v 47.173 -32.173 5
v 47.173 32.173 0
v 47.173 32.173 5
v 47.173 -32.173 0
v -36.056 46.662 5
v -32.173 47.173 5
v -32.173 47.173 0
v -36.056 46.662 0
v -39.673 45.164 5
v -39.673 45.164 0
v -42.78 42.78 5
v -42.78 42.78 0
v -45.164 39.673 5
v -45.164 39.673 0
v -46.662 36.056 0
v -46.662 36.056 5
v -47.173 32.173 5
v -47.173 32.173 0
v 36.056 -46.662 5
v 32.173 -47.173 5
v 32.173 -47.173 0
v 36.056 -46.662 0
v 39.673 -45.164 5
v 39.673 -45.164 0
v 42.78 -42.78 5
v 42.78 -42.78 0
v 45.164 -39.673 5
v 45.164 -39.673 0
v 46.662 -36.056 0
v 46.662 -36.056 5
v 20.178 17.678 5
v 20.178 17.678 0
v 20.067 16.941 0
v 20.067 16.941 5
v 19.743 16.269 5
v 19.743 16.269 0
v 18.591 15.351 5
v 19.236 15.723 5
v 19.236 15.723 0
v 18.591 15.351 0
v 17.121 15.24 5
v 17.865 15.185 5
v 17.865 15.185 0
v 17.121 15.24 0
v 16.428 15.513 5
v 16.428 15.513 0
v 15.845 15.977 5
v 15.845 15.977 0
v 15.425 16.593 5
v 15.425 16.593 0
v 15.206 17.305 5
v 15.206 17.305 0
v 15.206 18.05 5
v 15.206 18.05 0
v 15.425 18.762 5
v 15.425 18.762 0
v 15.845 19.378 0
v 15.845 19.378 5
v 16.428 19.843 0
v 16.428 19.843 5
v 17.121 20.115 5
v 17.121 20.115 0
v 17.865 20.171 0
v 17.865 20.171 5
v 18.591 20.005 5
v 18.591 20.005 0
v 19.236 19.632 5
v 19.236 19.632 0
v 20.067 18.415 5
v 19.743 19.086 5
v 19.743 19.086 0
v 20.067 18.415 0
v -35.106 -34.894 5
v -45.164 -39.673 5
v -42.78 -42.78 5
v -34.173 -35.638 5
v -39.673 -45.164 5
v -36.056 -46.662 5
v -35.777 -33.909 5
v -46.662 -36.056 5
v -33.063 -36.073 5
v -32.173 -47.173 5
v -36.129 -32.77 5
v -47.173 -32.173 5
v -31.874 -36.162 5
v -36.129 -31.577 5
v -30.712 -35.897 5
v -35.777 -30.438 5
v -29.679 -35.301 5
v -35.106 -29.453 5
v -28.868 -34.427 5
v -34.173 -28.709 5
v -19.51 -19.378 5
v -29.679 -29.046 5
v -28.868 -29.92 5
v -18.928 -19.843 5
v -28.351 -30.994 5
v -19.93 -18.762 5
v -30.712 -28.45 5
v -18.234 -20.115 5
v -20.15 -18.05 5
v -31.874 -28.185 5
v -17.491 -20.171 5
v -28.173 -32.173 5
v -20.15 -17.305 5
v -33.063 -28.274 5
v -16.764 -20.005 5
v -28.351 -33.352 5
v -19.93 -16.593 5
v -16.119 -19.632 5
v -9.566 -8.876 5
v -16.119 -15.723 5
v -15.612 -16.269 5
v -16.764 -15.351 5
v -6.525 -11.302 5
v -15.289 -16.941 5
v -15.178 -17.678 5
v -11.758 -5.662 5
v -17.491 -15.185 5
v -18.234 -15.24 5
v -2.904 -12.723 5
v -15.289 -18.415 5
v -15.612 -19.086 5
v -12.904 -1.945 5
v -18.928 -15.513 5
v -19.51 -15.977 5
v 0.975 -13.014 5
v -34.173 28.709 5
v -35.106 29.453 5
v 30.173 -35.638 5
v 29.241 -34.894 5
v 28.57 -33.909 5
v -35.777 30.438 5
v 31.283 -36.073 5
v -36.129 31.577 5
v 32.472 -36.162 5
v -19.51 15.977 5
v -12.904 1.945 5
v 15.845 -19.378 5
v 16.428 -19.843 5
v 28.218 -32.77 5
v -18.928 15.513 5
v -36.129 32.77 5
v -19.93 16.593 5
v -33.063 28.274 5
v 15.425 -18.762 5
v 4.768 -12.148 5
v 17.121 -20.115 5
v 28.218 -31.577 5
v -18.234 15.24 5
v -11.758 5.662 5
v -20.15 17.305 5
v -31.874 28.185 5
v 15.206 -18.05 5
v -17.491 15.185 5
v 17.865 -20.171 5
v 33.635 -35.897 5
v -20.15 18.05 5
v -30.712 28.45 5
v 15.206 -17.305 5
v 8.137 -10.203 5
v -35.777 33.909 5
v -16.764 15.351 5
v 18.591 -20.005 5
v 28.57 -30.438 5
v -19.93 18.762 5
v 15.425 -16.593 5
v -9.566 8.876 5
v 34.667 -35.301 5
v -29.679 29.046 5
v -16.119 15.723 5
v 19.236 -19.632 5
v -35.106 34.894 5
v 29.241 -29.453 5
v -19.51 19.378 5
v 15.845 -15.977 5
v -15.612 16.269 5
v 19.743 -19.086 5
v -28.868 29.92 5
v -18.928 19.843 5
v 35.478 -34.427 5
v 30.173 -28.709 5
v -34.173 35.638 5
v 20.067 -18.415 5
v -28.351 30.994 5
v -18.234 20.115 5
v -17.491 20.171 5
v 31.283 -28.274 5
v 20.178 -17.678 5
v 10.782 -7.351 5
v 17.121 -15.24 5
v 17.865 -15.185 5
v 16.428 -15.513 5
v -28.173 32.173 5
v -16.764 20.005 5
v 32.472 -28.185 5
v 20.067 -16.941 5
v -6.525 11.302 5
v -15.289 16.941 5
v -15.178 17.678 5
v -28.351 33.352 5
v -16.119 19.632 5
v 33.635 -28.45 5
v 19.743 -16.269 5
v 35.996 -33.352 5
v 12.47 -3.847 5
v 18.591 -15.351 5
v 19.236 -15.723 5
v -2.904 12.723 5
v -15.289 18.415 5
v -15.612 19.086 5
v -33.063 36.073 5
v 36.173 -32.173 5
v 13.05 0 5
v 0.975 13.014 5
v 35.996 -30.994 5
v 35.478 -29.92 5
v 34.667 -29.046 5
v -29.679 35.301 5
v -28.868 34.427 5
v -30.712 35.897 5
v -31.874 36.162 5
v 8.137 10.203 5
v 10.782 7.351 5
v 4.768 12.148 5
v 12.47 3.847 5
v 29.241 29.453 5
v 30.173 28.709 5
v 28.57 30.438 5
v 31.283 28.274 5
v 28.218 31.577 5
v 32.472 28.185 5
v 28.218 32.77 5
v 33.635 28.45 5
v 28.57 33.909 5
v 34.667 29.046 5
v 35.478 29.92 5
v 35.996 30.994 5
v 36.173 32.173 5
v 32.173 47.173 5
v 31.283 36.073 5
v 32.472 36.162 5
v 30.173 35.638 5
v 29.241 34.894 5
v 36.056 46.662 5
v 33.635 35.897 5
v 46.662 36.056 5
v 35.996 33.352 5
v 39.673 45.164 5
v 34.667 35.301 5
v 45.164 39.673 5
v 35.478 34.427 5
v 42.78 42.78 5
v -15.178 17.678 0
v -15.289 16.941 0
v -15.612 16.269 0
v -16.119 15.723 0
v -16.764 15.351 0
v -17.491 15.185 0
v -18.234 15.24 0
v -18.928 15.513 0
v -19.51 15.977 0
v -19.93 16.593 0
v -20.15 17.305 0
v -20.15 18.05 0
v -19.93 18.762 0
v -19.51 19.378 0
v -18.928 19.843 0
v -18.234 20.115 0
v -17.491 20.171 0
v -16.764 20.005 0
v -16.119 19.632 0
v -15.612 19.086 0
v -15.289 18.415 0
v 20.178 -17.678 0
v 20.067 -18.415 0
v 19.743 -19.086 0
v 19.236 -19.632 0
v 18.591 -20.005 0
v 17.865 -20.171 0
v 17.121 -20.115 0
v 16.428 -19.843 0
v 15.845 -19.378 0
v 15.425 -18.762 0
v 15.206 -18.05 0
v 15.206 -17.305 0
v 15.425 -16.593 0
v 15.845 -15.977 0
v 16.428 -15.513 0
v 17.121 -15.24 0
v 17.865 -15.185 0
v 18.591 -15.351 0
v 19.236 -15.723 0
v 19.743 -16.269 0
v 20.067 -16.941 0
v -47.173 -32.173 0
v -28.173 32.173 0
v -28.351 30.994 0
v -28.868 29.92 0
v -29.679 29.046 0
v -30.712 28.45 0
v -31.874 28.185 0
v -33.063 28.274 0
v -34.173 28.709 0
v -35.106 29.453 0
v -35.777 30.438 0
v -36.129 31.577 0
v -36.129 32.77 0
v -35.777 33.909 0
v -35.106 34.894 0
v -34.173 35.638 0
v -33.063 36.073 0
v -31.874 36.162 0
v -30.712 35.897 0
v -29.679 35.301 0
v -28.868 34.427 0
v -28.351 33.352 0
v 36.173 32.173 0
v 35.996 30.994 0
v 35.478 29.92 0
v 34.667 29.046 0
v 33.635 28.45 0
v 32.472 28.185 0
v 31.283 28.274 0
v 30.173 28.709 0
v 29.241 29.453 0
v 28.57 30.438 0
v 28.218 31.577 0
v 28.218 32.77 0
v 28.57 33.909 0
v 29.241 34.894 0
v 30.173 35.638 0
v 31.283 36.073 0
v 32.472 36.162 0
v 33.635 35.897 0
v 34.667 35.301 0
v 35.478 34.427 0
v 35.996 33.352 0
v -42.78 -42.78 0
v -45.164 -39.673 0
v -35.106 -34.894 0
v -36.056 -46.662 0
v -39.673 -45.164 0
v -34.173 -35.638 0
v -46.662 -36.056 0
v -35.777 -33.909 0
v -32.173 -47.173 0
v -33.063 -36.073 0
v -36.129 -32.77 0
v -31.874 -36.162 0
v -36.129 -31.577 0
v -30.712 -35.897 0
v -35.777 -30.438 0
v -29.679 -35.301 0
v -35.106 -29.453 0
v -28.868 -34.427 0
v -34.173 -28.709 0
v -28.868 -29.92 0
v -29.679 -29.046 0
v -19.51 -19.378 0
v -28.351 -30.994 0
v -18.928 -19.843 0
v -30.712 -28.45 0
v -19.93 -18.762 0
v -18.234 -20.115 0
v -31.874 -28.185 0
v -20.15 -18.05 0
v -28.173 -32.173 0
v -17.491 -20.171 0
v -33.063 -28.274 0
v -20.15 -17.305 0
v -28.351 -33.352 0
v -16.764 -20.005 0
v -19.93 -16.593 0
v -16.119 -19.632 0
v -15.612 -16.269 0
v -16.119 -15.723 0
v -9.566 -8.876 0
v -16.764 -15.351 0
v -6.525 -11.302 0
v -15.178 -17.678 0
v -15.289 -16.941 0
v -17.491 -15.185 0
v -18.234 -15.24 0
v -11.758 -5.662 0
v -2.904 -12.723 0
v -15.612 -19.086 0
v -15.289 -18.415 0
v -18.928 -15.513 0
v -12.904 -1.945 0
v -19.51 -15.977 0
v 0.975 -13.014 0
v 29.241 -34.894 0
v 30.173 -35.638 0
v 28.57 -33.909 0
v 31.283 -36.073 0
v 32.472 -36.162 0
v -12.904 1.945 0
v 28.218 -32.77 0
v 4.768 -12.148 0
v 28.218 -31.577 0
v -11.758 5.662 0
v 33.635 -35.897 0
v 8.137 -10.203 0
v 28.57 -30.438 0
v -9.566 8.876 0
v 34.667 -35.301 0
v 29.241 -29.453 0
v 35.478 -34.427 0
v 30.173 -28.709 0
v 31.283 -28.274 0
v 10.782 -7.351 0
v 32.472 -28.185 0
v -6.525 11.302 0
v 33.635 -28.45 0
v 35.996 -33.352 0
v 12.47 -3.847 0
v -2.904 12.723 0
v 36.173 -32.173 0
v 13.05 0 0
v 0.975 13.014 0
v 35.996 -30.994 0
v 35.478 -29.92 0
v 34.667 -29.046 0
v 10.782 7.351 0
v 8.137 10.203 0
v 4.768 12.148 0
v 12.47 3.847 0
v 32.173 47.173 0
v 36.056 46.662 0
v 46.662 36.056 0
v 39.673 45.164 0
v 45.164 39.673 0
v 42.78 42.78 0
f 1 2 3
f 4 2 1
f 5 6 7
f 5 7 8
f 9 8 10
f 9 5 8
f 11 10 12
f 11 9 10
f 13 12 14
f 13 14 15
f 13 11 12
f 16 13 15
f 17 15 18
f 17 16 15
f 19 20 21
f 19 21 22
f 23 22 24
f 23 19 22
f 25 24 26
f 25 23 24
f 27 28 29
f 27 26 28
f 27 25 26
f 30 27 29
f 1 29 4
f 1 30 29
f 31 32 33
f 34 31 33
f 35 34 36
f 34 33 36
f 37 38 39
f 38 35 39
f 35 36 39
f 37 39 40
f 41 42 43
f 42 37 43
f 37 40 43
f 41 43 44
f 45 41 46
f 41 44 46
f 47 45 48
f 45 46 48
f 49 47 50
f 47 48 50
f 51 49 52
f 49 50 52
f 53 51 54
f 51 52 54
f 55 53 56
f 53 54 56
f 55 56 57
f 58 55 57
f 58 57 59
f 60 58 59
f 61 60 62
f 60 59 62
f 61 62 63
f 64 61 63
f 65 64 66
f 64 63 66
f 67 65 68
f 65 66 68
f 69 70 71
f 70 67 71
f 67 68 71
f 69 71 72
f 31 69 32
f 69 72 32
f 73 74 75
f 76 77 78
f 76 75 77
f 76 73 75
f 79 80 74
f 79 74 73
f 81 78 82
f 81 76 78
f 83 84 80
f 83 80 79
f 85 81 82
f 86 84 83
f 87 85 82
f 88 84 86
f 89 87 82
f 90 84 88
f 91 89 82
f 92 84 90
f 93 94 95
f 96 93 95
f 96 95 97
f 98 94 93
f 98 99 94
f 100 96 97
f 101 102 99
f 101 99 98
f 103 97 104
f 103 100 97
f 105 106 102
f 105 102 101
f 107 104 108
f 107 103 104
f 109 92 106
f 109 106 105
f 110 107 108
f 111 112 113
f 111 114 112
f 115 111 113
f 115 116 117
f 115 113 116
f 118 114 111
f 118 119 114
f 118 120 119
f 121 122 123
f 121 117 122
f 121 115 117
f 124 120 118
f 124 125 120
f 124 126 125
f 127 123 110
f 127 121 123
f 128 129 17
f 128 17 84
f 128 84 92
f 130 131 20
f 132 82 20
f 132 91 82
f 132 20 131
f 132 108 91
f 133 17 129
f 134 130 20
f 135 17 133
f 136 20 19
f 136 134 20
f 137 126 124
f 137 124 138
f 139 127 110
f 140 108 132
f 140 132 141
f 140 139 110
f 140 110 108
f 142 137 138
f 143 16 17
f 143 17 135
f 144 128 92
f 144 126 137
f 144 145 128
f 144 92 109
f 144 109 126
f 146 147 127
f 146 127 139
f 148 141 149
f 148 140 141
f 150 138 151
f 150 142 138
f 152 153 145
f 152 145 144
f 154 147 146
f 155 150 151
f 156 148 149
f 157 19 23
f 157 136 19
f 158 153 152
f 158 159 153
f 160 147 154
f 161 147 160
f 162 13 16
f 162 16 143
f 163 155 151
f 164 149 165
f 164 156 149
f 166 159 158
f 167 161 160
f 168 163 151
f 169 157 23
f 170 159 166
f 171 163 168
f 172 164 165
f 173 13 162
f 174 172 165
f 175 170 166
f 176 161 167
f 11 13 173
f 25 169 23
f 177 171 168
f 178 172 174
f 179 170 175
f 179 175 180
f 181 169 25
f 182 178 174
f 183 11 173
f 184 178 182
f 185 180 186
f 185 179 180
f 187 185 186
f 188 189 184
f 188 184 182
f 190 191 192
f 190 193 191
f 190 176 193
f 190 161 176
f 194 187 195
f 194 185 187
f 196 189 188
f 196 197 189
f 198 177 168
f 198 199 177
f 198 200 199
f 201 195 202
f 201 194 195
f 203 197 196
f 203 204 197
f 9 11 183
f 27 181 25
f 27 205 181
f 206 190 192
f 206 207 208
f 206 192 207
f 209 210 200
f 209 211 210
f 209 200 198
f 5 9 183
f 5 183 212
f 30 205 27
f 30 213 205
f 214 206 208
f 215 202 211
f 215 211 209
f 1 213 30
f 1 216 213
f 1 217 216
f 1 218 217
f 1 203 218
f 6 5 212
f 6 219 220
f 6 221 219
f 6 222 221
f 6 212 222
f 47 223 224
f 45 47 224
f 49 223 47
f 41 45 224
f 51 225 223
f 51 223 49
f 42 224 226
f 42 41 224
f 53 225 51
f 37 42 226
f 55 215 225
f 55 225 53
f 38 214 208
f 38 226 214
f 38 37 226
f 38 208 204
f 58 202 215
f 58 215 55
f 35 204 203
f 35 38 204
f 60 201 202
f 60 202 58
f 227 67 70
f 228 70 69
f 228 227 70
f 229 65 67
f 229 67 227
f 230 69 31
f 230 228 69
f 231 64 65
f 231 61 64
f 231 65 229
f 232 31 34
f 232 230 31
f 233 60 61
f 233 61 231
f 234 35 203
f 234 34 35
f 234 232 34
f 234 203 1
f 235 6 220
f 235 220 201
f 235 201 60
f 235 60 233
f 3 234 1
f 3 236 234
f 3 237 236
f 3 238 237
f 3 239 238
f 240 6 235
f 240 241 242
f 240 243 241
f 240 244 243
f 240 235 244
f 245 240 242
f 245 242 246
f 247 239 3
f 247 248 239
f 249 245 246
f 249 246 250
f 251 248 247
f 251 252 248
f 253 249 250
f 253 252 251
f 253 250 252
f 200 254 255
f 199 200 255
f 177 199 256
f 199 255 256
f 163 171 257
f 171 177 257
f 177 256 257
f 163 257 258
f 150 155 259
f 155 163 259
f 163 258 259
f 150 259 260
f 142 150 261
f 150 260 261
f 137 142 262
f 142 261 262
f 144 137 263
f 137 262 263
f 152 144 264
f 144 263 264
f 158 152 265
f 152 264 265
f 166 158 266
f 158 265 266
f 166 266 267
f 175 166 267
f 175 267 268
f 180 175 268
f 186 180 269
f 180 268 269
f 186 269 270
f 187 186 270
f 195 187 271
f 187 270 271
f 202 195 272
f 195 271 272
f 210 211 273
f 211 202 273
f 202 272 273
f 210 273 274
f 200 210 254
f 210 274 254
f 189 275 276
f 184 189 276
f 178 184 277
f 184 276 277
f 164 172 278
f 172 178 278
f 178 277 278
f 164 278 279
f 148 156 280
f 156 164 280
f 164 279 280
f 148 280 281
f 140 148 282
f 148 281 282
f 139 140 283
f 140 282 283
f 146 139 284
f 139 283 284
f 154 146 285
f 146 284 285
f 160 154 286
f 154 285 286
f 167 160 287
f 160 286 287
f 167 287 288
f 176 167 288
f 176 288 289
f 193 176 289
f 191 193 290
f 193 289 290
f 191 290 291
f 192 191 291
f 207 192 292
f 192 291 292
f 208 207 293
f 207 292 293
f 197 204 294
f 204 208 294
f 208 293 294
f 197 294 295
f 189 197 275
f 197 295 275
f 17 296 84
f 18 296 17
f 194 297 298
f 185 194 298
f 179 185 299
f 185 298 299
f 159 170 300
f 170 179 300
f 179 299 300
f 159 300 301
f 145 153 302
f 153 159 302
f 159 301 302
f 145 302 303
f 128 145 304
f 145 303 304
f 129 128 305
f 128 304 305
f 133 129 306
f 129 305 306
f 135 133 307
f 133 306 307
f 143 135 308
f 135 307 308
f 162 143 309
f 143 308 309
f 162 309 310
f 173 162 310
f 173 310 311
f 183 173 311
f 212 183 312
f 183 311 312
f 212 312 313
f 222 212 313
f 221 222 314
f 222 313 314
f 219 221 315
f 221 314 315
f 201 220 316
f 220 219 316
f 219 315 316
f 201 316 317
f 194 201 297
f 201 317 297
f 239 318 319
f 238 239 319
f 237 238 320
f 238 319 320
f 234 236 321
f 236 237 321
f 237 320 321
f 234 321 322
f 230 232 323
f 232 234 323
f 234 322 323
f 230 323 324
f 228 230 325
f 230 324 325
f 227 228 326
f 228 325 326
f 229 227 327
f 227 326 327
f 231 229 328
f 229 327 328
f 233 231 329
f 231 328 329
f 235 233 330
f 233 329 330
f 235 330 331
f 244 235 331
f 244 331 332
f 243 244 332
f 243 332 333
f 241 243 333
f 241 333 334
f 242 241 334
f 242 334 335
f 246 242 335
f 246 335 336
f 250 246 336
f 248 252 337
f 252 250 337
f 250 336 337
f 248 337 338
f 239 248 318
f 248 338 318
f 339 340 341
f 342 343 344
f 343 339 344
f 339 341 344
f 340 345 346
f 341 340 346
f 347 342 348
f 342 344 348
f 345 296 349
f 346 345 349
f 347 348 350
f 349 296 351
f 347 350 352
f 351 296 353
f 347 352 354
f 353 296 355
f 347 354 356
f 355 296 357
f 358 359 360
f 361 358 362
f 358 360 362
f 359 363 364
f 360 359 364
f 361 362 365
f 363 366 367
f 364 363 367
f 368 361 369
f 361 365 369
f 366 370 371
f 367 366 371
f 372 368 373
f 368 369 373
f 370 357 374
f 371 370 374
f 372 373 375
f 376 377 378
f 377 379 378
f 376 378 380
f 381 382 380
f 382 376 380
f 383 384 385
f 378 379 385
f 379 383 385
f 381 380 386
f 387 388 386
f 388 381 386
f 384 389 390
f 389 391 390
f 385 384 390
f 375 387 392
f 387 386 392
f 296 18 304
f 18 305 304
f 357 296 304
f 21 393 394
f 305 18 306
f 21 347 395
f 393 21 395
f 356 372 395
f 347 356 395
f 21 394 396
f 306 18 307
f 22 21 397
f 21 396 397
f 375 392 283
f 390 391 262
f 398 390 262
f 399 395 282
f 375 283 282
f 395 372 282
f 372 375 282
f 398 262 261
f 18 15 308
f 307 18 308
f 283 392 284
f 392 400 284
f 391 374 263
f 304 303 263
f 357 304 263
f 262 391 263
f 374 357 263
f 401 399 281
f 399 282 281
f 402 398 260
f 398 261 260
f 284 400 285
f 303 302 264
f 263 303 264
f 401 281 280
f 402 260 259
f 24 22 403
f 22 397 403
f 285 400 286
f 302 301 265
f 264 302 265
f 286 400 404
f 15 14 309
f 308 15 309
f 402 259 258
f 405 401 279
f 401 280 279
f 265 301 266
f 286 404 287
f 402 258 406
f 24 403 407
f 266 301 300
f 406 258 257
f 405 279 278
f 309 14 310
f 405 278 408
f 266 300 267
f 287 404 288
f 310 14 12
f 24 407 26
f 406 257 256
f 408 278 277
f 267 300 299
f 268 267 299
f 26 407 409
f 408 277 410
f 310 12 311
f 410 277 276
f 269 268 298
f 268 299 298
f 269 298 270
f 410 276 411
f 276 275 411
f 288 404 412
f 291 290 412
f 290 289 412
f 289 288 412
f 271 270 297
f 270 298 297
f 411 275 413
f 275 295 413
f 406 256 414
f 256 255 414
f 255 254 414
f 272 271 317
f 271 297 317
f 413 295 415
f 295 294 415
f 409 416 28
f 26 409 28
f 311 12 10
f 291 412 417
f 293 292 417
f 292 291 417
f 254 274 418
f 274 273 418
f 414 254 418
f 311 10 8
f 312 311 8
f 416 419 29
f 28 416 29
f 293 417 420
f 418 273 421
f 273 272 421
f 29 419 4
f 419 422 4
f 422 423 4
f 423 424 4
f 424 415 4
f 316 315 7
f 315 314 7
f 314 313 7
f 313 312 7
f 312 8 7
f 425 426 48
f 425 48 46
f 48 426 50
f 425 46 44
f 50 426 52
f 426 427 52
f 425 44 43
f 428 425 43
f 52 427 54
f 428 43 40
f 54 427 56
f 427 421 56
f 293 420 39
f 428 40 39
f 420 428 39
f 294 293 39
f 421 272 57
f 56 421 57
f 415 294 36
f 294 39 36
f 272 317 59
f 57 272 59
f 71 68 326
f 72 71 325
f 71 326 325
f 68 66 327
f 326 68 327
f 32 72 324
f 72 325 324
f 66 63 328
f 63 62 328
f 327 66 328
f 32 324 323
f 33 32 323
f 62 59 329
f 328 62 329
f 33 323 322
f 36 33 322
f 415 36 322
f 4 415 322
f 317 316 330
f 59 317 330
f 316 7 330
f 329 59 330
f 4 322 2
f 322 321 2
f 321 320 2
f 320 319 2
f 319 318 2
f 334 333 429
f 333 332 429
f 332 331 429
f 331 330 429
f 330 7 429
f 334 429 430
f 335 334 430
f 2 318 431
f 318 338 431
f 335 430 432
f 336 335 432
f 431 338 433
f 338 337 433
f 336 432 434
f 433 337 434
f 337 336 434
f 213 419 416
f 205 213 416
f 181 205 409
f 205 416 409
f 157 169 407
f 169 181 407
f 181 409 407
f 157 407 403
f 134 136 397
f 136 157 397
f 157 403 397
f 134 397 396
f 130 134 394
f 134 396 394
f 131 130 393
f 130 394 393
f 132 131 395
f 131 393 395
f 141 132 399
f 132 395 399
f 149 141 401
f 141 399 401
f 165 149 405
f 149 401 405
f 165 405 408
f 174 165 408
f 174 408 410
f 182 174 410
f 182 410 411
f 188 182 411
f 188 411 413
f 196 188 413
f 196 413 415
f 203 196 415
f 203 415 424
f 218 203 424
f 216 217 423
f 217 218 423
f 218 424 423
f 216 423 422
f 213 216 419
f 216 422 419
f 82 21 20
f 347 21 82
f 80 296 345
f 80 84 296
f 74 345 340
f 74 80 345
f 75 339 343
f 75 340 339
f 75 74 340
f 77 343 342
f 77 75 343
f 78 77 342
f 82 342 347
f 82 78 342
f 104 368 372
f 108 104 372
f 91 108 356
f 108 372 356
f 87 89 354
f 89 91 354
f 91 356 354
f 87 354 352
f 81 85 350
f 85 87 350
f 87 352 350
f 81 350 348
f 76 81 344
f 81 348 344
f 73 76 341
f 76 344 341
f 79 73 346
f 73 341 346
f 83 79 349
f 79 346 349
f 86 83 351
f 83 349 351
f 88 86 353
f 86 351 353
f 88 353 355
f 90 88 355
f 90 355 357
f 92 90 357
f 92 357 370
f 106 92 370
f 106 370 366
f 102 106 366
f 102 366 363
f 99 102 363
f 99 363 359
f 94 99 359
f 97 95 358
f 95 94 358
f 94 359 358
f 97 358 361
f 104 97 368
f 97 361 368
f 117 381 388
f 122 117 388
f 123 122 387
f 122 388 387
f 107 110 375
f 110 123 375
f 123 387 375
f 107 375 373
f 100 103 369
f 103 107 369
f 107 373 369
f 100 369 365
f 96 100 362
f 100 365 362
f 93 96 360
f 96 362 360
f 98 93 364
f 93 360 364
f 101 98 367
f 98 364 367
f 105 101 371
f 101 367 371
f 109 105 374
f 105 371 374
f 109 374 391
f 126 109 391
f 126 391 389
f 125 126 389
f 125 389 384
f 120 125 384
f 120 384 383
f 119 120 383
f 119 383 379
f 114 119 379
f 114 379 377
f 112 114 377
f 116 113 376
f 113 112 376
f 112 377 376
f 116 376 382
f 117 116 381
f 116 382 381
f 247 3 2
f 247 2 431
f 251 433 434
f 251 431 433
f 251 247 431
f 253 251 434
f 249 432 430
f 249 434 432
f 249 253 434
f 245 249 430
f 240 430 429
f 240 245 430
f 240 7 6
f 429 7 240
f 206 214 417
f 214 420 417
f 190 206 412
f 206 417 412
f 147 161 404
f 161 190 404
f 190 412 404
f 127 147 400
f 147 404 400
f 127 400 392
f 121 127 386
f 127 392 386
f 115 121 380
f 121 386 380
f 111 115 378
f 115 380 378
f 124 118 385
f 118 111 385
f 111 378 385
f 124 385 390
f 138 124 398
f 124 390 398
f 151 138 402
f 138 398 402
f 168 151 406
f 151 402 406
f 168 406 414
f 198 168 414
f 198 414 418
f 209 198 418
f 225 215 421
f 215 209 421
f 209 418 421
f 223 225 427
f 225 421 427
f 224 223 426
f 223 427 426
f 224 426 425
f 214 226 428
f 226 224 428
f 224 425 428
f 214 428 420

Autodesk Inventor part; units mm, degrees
ref_plane "YZ Plane" through (0, 0, 0) normal (1, 0, 0) x (0, 1, 0)
ref_plane "XZ Plane" through (0, 0, 0) normal (0, 1, 0) x (-1, 0, 0)
ref_plane "XY Plane" through (0, 0, 0) normal (0, 0, 1) x (1, 0, 0)
sketch "スケッチ1" plane through (0, 0, 0) normal (0, 0, 1) x (1, 0, 0)
  line L0 (-47.1734, 47.1734) -> (47.1734, 47.1734)
  line L1 (47.1734, 47.1734) -> (47.1734, -47.1734)
  line L2 (47.1734, -47.1734) -> (-47.1734, -47.1734)
  line L3 (-47.1734, -47.1734) -> (-47.1734, 47.1734)
  line L4 (-47.1734, 47.1734) -> (47.1734, -47.1734) construction
  line L5 (47.1734, 47.1734) -> (-47.1734, -47.1734) construction
  circle A0 centre (32.1734, 32.1734) radius 4
  circle A1 centre (-32.1734, 32.1734) radius 4
  circle A2 centre (-32.1734, -32.1734) radius 4
  circle A3 centre (32.1734, -32.1734) radius 4
  circle A4 centre (0, 0) radius 45.5 construction
  circle A5 centre (0, 0) radius 13.05
  circle A6 centre (0, 0) radius 25 construction
  circle A7 centre (17.6777, 17.6777) radius 2.5
  circle A8 centre (-17.6777, 17.6777) radius 2.5
  circle A9 centre (-17.6777, -17.6777) radius 2.5
  circle A10 centre (17.6777, -17.6777) radius 2.5
  line L6 (-7.8, -7.8) -> (7.8, 7.8) construction
  line L7 (7.8, -7.8) -> (-7.8, 7.8) construction
  line L8 (-17.6777, -17.6777) -> (-17.6777, 17.6777) construction
  line L9 (-17.6777, 17.6777) -> (17.6777, 17.6777) construction
  line L10 (17.6777, -17.6777) -> (-17.6777, -17.6777) construction
  line L11 (17.6777, -17.6777) -> (17.6777, 17.6777) construction
  dimension "d4" = 91
  dimension "d2" = 360
  dimension "d5" = 26.1
  dimension "d7" = 8
  dimension "d8" = 5
  dimension "d12" = 360
  dimension "d26" = 15
  dimension "d27" = 50
extrude "押し出し2" add sketch "スケッチ1" along normal blind 5
fillet "フィレット4" radius 15 4 edges at (47.1734, -47.1734, 2.5) (47.1734, 47.1734, 2.5) (-47.1734, -47.1734, 2.5) (-47.1734, 47.1734, 2.5)
properties part number "車輪ハブ1"
